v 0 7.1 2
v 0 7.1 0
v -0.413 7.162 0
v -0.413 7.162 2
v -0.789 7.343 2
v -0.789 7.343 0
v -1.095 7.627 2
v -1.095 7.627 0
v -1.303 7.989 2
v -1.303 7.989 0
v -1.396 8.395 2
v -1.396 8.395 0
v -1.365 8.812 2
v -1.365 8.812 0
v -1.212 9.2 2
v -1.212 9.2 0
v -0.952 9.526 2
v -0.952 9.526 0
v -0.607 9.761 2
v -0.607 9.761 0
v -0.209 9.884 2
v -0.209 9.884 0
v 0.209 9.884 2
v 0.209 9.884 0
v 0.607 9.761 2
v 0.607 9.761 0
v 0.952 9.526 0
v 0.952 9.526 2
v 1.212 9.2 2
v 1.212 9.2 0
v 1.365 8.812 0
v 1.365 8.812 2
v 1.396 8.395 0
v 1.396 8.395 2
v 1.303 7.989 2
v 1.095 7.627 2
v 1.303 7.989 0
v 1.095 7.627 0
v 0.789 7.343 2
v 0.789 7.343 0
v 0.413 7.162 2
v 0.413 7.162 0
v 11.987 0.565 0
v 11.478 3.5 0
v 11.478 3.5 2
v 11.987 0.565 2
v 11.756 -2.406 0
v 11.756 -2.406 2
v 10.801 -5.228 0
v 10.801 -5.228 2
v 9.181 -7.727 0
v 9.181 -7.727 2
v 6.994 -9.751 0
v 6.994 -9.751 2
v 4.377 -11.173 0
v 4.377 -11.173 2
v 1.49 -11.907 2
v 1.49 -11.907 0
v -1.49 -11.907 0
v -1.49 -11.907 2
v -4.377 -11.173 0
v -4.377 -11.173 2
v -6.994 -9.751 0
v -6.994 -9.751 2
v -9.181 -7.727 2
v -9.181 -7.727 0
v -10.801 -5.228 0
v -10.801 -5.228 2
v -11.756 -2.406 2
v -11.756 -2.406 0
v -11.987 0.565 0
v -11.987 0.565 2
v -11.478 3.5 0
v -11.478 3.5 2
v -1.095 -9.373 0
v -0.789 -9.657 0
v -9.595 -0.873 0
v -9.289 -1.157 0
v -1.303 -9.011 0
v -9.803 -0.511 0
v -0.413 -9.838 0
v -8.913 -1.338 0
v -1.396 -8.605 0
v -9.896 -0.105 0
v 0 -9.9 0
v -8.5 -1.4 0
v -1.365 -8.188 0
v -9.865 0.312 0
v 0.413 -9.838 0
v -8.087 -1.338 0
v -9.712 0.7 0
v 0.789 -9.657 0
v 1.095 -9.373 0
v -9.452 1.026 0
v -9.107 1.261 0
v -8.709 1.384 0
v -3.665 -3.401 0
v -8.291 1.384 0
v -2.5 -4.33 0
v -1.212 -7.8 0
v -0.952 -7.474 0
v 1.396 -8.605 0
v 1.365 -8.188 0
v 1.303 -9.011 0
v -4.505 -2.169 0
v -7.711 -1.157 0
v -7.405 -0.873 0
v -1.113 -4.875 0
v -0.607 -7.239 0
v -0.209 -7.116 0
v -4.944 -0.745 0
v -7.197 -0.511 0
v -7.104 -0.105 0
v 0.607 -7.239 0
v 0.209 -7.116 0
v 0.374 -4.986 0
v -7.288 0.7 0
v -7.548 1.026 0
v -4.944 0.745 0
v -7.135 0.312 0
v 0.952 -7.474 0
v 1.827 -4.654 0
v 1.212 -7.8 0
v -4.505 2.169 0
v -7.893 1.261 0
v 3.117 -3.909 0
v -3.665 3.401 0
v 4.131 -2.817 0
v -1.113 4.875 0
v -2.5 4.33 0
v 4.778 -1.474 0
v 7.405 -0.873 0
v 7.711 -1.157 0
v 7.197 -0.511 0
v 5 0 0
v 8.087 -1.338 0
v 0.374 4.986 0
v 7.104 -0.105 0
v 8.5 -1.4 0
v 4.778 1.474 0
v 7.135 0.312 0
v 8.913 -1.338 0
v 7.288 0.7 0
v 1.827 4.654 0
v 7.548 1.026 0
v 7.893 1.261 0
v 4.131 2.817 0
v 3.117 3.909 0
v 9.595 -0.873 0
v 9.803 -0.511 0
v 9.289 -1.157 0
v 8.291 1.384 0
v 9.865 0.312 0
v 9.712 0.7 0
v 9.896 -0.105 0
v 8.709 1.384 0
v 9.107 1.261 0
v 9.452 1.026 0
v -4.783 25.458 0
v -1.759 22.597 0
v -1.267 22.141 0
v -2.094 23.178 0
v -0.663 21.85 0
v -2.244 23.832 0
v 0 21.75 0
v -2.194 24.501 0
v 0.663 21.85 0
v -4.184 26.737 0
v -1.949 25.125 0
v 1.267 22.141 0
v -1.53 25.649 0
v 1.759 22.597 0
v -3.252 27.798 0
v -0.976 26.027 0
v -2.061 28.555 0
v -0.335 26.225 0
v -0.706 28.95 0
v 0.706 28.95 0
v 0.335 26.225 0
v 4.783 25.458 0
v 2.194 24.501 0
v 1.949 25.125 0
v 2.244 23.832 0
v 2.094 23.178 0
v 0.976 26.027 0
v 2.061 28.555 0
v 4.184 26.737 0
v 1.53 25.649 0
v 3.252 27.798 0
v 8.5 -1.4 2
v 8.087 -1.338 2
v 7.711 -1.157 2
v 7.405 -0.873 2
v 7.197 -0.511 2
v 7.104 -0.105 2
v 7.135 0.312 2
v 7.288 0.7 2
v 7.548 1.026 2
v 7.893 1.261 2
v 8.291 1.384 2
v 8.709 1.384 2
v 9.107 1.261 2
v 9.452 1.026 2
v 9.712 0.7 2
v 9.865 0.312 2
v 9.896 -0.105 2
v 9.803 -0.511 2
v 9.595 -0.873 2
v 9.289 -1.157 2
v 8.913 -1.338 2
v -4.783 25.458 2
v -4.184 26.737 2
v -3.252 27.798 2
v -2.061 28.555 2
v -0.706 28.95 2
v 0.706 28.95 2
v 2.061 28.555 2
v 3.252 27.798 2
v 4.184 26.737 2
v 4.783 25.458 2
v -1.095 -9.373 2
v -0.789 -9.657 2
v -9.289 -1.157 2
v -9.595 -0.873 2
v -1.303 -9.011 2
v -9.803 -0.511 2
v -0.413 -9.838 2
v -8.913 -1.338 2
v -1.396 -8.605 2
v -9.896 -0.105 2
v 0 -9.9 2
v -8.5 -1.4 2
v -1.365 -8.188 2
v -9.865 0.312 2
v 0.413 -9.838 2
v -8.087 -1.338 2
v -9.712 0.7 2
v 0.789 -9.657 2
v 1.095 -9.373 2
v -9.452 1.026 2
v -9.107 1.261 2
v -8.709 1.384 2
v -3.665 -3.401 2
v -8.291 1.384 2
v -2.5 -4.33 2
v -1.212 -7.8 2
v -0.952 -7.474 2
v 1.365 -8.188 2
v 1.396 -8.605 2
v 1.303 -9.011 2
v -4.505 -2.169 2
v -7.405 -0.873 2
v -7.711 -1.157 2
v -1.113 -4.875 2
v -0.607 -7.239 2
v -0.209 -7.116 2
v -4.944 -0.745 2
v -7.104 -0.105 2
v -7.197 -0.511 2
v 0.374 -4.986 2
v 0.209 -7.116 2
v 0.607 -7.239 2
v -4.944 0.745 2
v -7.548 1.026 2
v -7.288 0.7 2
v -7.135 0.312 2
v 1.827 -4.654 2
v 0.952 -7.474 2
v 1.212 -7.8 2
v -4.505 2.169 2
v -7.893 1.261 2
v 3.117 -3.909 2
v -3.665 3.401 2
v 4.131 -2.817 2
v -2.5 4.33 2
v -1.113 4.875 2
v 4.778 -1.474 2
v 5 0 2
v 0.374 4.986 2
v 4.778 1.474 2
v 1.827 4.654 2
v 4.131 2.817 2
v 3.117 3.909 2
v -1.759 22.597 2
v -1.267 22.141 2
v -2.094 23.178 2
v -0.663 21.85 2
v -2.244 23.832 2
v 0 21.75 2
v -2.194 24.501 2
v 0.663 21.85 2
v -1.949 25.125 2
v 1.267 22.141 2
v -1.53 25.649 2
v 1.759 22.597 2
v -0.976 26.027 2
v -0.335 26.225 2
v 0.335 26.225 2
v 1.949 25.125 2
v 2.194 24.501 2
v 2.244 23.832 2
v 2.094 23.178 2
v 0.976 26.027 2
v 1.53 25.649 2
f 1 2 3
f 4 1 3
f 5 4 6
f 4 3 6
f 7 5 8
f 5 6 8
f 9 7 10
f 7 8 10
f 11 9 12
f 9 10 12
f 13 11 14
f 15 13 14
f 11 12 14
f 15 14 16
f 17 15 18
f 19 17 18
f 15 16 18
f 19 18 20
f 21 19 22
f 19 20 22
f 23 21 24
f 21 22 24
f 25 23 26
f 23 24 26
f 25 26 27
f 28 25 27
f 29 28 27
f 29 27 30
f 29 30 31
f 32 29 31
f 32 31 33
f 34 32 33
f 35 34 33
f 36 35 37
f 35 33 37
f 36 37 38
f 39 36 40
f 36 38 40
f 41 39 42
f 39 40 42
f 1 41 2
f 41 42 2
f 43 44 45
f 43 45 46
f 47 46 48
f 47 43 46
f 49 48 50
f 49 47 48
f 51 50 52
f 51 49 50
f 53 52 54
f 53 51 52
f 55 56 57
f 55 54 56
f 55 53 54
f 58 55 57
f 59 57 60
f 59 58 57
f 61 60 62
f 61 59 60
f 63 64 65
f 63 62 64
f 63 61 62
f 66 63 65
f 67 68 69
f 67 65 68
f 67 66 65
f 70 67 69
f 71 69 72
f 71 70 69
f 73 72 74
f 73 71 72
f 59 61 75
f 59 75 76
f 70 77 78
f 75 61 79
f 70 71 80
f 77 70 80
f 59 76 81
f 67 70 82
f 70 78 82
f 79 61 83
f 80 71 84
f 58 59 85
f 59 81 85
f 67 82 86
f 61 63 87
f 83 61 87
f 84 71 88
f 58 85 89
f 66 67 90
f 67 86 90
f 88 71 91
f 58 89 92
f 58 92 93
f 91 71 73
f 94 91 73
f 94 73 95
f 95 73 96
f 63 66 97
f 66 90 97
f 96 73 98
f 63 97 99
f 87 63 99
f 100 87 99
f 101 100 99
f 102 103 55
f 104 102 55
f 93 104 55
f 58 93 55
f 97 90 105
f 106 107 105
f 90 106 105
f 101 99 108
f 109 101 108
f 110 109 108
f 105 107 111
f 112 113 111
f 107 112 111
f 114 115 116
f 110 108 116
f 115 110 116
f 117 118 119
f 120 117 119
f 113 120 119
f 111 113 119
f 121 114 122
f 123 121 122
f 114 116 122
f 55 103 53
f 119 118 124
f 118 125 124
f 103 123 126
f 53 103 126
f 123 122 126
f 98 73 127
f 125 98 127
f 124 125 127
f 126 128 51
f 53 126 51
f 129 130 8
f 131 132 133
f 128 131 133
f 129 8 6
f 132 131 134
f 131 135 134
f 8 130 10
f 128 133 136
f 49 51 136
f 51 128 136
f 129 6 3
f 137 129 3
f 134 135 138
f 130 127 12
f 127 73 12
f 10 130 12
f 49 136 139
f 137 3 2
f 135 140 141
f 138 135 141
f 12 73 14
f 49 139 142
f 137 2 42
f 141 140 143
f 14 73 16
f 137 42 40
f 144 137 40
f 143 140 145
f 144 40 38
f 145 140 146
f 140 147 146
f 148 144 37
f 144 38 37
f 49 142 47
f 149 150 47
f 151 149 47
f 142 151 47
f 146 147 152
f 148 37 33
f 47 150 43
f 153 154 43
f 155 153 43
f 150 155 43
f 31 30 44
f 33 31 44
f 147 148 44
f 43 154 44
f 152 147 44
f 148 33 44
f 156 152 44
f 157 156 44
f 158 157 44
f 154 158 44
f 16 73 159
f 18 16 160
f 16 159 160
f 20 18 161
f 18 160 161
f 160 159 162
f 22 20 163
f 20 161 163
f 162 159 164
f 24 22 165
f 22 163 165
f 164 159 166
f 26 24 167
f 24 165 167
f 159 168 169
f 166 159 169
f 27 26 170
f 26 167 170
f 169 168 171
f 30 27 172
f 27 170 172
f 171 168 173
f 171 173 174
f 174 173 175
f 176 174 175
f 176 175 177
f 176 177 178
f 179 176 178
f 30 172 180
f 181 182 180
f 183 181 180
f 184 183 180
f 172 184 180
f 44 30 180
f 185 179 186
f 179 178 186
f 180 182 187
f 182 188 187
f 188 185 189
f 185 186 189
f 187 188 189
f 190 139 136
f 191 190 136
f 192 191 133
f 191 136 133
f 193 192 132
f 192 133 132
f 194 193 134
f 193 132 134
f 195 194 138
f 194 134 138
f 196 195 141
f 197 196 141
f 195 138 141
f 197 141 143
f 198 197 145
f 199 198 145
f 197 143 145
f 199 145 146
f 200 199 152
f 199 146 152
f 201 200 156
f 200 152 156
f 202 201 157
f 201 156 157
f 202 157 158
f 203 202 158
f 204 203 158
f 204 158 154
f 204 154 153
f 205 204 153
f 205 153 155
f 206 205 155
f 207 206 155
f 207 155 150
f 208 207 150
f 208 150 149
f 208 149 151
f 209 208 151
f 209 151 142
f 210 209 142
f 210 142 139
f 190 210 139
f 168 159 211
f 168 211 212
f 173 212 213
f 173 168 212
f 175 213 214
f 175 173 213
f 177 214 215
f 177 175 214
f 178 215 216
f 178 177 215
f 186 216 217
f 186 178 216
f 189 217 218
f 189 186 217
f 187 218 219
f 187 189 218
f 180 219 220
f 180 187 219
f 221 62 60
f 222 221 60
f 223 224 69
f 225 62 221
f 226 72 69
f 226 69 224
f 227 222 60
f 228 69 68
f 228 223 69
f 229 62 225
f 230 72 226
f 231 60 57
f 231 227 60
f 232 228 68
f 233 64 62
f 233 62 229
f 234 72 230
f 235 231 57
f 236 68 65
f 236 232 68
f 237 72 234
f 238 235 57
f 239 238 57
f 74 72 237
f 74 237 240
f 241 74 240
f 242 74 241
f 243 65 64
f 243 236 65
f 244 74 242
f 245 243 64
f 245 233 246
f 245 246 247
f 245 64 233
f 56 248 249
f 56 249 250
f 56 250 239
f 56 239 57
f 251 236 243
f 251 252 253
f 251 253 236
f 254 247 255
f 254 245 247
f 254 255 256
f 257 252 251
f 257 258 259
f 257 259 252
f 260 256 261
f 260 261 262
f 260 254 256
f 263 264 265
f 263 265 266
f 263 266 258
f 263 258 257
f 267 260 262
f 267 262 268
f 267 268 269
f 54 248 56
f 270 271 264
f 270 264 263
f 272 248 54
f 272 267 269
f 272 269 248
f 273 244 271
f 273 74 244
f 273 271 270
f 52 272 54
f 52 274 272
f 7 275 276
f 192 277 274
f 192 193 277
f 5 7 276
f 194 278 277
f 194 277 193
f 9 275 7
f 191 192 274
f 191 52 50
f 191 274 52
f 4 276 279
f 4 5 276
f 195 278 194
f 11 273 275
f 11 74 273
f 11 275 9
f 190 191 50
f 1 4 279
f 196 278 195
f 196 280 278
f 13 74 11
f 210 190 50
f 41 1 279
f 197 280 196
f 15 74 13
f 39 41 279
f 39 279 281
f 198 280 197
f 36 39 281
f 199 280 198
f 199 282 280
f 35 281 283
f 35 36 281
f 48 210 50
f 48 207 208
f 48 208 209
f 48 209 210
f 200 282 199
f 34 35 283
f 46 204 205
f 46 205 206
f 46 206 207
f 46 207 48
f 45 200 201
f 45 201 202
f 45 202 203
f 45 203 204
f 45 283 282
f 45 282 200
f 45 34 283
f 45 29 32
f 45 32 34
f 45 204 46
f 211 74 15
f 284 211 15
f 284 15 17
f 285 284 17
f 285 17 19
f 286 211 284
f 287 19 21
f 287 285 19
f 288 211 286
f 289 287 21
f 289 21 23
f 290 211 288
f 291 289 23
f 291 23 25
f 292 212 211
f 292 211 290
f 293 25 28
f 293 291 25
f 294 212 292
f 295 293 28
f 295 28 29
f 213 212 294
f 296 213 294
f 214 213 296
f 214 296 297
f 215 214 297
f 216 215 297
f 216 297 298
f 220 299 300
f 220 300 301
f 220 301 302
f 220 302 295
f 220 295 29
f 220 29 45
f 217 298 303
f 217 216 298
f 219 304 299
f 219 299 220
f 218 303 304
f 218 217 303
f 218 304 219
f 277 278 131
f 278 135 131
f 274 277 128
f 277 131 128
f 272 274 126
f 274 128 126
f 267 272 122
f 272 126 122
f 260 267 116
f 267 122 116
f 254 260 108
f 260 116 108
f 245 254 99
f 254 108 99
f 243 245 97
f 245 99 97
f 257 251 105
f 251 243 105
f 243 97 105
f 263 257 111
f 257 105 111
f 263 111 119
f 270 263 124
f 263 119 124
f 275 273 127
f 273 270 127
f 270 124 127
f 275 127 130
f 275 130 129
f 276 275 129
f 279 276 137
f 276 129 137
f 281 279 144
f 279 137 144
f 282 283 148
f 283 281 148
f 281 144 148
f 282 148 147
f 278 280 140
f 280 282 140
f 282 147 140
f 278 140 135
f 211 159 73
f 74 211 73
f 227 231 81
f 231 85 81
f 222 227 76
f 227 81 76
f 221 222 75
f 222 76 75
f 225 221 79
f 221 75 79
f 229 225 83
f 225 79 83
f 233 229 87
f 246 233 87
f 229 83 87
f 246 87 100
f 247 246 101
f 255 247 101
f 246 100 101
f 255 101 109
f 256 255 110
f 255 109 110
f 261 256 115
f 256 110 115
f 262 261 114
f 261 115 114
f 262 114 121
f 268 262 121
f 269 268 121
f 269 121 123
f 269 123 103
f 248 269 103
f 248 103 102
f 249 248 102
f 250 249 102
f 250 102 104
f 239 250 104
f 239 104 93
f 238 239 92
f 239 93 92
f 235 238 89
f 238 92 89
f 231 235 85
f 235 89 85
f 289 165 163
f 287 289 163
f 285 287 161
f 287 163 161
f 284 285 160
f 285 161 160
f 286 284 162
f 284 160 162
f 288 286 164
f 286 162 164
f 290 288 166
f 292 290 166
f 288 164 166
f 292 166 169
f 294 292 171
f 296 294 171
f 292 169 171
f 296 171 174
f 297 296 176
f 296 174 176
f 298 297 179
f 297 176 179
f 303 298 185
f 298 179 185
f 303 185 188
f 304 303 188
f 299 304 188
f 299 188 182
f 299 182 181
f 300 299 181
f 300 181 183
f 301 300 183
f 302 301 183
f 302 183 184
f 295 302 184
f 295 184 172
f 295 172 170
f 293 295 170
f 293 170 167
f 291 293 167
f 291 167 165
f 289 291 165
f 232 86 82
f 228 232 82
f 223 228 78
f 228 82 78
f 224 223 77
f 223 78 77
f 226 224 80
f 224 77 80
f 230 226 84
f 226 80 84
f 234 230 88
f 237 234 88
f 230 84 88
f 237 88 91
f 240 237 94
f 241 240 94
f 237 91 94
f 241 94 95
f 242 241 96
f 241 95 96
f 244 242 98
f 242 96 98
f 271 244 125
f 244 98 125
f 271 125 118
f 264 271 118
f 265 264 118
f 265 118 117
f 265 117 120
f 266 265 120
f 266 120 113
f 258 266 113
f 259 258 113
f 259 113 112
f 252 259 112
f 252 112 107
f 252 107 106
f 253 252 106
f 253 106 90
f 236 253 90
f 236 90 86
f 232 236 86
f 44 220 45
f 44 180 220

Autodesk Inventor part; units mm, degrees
ref_plane "YZ Plane" through (0, 0, 0) normal (1, 0, 0) x (0, 1, 0)
ref_plane "XZ Plane" through (0, 0, 0) normal (0, 1, 0) x (-1, 0, 0)
ref_plane "XY Plane" through (0, 0, 0) normal (0, 0, 1) x (1, 0, 0)
sketch "スケッチ1" plane through (0, 0, 0) normal (0, 0, 1) x (1, 0, 0)
  circle A0 centre (0, 0) radius 5
  arc A1 (-11.4782, 3.5) -> (11.4782, 3.5) centre (0, 0) ccw
  arc A2 (4.7826, 25.4583) -> (-4.7826, 25.4583) centre (0, 24) ccw
  line L0 (-4.7826, 25.4583) -> (-11.4782, 3.5)
  line L1 (4.7826, 25.4583) -> (11.4782, 3.5)
  dimension "d0" = 10
  dimension "d1" = 24
  dimension "d2" = 10
  dimension "d3" = 24
extrude "押し出し1" add sketch "スケッチ1" along normal blind 2
sketch "スケッチ2" plane through (0, 0, 2) normal (0, 0, 1) x (1, 0, 0)
  line L0 (0, 0) -> (12, 0) construction
  arc A0 (-11.4782, 3.5) -> (11.4782, 3.5) centre (0, 0) ccw projected
  line L1 (0, 0) -> (0, 12) construction
  line L2 (0, 0) -> (-12, 0) construction
  line L3 (0, 0) -> (0, -12) construction
  point P0 (8.5, 0)
  point P1 (0, 8.5)
  point P2 (-8.5, 0)
  point P3 (0, -8.5)
  dimension "d6" = 8.5
  dimension "d9" = 360
hole "穴1" at (8.5, 0, 2) at (0, 8.5, 2) at (-8.5, 0, 2) at (0, -8.5, 2) direction (0, 0, -1) diameter 2.8 end through all
sketch "スケッチ3" plane through (0, 0, 2) normal (0, 0, 1) x (1, 0, 0)
  arc A0 (4.7826, 25.4583) -> (-4.7826, 25.4583) centre (0, 24) ccw projected
  point P0 (0, 0)
hole "穴2" at (0, 24, 2) direction (0, 0, -1) diameter 4.5 end through all
properties part number "lever"
